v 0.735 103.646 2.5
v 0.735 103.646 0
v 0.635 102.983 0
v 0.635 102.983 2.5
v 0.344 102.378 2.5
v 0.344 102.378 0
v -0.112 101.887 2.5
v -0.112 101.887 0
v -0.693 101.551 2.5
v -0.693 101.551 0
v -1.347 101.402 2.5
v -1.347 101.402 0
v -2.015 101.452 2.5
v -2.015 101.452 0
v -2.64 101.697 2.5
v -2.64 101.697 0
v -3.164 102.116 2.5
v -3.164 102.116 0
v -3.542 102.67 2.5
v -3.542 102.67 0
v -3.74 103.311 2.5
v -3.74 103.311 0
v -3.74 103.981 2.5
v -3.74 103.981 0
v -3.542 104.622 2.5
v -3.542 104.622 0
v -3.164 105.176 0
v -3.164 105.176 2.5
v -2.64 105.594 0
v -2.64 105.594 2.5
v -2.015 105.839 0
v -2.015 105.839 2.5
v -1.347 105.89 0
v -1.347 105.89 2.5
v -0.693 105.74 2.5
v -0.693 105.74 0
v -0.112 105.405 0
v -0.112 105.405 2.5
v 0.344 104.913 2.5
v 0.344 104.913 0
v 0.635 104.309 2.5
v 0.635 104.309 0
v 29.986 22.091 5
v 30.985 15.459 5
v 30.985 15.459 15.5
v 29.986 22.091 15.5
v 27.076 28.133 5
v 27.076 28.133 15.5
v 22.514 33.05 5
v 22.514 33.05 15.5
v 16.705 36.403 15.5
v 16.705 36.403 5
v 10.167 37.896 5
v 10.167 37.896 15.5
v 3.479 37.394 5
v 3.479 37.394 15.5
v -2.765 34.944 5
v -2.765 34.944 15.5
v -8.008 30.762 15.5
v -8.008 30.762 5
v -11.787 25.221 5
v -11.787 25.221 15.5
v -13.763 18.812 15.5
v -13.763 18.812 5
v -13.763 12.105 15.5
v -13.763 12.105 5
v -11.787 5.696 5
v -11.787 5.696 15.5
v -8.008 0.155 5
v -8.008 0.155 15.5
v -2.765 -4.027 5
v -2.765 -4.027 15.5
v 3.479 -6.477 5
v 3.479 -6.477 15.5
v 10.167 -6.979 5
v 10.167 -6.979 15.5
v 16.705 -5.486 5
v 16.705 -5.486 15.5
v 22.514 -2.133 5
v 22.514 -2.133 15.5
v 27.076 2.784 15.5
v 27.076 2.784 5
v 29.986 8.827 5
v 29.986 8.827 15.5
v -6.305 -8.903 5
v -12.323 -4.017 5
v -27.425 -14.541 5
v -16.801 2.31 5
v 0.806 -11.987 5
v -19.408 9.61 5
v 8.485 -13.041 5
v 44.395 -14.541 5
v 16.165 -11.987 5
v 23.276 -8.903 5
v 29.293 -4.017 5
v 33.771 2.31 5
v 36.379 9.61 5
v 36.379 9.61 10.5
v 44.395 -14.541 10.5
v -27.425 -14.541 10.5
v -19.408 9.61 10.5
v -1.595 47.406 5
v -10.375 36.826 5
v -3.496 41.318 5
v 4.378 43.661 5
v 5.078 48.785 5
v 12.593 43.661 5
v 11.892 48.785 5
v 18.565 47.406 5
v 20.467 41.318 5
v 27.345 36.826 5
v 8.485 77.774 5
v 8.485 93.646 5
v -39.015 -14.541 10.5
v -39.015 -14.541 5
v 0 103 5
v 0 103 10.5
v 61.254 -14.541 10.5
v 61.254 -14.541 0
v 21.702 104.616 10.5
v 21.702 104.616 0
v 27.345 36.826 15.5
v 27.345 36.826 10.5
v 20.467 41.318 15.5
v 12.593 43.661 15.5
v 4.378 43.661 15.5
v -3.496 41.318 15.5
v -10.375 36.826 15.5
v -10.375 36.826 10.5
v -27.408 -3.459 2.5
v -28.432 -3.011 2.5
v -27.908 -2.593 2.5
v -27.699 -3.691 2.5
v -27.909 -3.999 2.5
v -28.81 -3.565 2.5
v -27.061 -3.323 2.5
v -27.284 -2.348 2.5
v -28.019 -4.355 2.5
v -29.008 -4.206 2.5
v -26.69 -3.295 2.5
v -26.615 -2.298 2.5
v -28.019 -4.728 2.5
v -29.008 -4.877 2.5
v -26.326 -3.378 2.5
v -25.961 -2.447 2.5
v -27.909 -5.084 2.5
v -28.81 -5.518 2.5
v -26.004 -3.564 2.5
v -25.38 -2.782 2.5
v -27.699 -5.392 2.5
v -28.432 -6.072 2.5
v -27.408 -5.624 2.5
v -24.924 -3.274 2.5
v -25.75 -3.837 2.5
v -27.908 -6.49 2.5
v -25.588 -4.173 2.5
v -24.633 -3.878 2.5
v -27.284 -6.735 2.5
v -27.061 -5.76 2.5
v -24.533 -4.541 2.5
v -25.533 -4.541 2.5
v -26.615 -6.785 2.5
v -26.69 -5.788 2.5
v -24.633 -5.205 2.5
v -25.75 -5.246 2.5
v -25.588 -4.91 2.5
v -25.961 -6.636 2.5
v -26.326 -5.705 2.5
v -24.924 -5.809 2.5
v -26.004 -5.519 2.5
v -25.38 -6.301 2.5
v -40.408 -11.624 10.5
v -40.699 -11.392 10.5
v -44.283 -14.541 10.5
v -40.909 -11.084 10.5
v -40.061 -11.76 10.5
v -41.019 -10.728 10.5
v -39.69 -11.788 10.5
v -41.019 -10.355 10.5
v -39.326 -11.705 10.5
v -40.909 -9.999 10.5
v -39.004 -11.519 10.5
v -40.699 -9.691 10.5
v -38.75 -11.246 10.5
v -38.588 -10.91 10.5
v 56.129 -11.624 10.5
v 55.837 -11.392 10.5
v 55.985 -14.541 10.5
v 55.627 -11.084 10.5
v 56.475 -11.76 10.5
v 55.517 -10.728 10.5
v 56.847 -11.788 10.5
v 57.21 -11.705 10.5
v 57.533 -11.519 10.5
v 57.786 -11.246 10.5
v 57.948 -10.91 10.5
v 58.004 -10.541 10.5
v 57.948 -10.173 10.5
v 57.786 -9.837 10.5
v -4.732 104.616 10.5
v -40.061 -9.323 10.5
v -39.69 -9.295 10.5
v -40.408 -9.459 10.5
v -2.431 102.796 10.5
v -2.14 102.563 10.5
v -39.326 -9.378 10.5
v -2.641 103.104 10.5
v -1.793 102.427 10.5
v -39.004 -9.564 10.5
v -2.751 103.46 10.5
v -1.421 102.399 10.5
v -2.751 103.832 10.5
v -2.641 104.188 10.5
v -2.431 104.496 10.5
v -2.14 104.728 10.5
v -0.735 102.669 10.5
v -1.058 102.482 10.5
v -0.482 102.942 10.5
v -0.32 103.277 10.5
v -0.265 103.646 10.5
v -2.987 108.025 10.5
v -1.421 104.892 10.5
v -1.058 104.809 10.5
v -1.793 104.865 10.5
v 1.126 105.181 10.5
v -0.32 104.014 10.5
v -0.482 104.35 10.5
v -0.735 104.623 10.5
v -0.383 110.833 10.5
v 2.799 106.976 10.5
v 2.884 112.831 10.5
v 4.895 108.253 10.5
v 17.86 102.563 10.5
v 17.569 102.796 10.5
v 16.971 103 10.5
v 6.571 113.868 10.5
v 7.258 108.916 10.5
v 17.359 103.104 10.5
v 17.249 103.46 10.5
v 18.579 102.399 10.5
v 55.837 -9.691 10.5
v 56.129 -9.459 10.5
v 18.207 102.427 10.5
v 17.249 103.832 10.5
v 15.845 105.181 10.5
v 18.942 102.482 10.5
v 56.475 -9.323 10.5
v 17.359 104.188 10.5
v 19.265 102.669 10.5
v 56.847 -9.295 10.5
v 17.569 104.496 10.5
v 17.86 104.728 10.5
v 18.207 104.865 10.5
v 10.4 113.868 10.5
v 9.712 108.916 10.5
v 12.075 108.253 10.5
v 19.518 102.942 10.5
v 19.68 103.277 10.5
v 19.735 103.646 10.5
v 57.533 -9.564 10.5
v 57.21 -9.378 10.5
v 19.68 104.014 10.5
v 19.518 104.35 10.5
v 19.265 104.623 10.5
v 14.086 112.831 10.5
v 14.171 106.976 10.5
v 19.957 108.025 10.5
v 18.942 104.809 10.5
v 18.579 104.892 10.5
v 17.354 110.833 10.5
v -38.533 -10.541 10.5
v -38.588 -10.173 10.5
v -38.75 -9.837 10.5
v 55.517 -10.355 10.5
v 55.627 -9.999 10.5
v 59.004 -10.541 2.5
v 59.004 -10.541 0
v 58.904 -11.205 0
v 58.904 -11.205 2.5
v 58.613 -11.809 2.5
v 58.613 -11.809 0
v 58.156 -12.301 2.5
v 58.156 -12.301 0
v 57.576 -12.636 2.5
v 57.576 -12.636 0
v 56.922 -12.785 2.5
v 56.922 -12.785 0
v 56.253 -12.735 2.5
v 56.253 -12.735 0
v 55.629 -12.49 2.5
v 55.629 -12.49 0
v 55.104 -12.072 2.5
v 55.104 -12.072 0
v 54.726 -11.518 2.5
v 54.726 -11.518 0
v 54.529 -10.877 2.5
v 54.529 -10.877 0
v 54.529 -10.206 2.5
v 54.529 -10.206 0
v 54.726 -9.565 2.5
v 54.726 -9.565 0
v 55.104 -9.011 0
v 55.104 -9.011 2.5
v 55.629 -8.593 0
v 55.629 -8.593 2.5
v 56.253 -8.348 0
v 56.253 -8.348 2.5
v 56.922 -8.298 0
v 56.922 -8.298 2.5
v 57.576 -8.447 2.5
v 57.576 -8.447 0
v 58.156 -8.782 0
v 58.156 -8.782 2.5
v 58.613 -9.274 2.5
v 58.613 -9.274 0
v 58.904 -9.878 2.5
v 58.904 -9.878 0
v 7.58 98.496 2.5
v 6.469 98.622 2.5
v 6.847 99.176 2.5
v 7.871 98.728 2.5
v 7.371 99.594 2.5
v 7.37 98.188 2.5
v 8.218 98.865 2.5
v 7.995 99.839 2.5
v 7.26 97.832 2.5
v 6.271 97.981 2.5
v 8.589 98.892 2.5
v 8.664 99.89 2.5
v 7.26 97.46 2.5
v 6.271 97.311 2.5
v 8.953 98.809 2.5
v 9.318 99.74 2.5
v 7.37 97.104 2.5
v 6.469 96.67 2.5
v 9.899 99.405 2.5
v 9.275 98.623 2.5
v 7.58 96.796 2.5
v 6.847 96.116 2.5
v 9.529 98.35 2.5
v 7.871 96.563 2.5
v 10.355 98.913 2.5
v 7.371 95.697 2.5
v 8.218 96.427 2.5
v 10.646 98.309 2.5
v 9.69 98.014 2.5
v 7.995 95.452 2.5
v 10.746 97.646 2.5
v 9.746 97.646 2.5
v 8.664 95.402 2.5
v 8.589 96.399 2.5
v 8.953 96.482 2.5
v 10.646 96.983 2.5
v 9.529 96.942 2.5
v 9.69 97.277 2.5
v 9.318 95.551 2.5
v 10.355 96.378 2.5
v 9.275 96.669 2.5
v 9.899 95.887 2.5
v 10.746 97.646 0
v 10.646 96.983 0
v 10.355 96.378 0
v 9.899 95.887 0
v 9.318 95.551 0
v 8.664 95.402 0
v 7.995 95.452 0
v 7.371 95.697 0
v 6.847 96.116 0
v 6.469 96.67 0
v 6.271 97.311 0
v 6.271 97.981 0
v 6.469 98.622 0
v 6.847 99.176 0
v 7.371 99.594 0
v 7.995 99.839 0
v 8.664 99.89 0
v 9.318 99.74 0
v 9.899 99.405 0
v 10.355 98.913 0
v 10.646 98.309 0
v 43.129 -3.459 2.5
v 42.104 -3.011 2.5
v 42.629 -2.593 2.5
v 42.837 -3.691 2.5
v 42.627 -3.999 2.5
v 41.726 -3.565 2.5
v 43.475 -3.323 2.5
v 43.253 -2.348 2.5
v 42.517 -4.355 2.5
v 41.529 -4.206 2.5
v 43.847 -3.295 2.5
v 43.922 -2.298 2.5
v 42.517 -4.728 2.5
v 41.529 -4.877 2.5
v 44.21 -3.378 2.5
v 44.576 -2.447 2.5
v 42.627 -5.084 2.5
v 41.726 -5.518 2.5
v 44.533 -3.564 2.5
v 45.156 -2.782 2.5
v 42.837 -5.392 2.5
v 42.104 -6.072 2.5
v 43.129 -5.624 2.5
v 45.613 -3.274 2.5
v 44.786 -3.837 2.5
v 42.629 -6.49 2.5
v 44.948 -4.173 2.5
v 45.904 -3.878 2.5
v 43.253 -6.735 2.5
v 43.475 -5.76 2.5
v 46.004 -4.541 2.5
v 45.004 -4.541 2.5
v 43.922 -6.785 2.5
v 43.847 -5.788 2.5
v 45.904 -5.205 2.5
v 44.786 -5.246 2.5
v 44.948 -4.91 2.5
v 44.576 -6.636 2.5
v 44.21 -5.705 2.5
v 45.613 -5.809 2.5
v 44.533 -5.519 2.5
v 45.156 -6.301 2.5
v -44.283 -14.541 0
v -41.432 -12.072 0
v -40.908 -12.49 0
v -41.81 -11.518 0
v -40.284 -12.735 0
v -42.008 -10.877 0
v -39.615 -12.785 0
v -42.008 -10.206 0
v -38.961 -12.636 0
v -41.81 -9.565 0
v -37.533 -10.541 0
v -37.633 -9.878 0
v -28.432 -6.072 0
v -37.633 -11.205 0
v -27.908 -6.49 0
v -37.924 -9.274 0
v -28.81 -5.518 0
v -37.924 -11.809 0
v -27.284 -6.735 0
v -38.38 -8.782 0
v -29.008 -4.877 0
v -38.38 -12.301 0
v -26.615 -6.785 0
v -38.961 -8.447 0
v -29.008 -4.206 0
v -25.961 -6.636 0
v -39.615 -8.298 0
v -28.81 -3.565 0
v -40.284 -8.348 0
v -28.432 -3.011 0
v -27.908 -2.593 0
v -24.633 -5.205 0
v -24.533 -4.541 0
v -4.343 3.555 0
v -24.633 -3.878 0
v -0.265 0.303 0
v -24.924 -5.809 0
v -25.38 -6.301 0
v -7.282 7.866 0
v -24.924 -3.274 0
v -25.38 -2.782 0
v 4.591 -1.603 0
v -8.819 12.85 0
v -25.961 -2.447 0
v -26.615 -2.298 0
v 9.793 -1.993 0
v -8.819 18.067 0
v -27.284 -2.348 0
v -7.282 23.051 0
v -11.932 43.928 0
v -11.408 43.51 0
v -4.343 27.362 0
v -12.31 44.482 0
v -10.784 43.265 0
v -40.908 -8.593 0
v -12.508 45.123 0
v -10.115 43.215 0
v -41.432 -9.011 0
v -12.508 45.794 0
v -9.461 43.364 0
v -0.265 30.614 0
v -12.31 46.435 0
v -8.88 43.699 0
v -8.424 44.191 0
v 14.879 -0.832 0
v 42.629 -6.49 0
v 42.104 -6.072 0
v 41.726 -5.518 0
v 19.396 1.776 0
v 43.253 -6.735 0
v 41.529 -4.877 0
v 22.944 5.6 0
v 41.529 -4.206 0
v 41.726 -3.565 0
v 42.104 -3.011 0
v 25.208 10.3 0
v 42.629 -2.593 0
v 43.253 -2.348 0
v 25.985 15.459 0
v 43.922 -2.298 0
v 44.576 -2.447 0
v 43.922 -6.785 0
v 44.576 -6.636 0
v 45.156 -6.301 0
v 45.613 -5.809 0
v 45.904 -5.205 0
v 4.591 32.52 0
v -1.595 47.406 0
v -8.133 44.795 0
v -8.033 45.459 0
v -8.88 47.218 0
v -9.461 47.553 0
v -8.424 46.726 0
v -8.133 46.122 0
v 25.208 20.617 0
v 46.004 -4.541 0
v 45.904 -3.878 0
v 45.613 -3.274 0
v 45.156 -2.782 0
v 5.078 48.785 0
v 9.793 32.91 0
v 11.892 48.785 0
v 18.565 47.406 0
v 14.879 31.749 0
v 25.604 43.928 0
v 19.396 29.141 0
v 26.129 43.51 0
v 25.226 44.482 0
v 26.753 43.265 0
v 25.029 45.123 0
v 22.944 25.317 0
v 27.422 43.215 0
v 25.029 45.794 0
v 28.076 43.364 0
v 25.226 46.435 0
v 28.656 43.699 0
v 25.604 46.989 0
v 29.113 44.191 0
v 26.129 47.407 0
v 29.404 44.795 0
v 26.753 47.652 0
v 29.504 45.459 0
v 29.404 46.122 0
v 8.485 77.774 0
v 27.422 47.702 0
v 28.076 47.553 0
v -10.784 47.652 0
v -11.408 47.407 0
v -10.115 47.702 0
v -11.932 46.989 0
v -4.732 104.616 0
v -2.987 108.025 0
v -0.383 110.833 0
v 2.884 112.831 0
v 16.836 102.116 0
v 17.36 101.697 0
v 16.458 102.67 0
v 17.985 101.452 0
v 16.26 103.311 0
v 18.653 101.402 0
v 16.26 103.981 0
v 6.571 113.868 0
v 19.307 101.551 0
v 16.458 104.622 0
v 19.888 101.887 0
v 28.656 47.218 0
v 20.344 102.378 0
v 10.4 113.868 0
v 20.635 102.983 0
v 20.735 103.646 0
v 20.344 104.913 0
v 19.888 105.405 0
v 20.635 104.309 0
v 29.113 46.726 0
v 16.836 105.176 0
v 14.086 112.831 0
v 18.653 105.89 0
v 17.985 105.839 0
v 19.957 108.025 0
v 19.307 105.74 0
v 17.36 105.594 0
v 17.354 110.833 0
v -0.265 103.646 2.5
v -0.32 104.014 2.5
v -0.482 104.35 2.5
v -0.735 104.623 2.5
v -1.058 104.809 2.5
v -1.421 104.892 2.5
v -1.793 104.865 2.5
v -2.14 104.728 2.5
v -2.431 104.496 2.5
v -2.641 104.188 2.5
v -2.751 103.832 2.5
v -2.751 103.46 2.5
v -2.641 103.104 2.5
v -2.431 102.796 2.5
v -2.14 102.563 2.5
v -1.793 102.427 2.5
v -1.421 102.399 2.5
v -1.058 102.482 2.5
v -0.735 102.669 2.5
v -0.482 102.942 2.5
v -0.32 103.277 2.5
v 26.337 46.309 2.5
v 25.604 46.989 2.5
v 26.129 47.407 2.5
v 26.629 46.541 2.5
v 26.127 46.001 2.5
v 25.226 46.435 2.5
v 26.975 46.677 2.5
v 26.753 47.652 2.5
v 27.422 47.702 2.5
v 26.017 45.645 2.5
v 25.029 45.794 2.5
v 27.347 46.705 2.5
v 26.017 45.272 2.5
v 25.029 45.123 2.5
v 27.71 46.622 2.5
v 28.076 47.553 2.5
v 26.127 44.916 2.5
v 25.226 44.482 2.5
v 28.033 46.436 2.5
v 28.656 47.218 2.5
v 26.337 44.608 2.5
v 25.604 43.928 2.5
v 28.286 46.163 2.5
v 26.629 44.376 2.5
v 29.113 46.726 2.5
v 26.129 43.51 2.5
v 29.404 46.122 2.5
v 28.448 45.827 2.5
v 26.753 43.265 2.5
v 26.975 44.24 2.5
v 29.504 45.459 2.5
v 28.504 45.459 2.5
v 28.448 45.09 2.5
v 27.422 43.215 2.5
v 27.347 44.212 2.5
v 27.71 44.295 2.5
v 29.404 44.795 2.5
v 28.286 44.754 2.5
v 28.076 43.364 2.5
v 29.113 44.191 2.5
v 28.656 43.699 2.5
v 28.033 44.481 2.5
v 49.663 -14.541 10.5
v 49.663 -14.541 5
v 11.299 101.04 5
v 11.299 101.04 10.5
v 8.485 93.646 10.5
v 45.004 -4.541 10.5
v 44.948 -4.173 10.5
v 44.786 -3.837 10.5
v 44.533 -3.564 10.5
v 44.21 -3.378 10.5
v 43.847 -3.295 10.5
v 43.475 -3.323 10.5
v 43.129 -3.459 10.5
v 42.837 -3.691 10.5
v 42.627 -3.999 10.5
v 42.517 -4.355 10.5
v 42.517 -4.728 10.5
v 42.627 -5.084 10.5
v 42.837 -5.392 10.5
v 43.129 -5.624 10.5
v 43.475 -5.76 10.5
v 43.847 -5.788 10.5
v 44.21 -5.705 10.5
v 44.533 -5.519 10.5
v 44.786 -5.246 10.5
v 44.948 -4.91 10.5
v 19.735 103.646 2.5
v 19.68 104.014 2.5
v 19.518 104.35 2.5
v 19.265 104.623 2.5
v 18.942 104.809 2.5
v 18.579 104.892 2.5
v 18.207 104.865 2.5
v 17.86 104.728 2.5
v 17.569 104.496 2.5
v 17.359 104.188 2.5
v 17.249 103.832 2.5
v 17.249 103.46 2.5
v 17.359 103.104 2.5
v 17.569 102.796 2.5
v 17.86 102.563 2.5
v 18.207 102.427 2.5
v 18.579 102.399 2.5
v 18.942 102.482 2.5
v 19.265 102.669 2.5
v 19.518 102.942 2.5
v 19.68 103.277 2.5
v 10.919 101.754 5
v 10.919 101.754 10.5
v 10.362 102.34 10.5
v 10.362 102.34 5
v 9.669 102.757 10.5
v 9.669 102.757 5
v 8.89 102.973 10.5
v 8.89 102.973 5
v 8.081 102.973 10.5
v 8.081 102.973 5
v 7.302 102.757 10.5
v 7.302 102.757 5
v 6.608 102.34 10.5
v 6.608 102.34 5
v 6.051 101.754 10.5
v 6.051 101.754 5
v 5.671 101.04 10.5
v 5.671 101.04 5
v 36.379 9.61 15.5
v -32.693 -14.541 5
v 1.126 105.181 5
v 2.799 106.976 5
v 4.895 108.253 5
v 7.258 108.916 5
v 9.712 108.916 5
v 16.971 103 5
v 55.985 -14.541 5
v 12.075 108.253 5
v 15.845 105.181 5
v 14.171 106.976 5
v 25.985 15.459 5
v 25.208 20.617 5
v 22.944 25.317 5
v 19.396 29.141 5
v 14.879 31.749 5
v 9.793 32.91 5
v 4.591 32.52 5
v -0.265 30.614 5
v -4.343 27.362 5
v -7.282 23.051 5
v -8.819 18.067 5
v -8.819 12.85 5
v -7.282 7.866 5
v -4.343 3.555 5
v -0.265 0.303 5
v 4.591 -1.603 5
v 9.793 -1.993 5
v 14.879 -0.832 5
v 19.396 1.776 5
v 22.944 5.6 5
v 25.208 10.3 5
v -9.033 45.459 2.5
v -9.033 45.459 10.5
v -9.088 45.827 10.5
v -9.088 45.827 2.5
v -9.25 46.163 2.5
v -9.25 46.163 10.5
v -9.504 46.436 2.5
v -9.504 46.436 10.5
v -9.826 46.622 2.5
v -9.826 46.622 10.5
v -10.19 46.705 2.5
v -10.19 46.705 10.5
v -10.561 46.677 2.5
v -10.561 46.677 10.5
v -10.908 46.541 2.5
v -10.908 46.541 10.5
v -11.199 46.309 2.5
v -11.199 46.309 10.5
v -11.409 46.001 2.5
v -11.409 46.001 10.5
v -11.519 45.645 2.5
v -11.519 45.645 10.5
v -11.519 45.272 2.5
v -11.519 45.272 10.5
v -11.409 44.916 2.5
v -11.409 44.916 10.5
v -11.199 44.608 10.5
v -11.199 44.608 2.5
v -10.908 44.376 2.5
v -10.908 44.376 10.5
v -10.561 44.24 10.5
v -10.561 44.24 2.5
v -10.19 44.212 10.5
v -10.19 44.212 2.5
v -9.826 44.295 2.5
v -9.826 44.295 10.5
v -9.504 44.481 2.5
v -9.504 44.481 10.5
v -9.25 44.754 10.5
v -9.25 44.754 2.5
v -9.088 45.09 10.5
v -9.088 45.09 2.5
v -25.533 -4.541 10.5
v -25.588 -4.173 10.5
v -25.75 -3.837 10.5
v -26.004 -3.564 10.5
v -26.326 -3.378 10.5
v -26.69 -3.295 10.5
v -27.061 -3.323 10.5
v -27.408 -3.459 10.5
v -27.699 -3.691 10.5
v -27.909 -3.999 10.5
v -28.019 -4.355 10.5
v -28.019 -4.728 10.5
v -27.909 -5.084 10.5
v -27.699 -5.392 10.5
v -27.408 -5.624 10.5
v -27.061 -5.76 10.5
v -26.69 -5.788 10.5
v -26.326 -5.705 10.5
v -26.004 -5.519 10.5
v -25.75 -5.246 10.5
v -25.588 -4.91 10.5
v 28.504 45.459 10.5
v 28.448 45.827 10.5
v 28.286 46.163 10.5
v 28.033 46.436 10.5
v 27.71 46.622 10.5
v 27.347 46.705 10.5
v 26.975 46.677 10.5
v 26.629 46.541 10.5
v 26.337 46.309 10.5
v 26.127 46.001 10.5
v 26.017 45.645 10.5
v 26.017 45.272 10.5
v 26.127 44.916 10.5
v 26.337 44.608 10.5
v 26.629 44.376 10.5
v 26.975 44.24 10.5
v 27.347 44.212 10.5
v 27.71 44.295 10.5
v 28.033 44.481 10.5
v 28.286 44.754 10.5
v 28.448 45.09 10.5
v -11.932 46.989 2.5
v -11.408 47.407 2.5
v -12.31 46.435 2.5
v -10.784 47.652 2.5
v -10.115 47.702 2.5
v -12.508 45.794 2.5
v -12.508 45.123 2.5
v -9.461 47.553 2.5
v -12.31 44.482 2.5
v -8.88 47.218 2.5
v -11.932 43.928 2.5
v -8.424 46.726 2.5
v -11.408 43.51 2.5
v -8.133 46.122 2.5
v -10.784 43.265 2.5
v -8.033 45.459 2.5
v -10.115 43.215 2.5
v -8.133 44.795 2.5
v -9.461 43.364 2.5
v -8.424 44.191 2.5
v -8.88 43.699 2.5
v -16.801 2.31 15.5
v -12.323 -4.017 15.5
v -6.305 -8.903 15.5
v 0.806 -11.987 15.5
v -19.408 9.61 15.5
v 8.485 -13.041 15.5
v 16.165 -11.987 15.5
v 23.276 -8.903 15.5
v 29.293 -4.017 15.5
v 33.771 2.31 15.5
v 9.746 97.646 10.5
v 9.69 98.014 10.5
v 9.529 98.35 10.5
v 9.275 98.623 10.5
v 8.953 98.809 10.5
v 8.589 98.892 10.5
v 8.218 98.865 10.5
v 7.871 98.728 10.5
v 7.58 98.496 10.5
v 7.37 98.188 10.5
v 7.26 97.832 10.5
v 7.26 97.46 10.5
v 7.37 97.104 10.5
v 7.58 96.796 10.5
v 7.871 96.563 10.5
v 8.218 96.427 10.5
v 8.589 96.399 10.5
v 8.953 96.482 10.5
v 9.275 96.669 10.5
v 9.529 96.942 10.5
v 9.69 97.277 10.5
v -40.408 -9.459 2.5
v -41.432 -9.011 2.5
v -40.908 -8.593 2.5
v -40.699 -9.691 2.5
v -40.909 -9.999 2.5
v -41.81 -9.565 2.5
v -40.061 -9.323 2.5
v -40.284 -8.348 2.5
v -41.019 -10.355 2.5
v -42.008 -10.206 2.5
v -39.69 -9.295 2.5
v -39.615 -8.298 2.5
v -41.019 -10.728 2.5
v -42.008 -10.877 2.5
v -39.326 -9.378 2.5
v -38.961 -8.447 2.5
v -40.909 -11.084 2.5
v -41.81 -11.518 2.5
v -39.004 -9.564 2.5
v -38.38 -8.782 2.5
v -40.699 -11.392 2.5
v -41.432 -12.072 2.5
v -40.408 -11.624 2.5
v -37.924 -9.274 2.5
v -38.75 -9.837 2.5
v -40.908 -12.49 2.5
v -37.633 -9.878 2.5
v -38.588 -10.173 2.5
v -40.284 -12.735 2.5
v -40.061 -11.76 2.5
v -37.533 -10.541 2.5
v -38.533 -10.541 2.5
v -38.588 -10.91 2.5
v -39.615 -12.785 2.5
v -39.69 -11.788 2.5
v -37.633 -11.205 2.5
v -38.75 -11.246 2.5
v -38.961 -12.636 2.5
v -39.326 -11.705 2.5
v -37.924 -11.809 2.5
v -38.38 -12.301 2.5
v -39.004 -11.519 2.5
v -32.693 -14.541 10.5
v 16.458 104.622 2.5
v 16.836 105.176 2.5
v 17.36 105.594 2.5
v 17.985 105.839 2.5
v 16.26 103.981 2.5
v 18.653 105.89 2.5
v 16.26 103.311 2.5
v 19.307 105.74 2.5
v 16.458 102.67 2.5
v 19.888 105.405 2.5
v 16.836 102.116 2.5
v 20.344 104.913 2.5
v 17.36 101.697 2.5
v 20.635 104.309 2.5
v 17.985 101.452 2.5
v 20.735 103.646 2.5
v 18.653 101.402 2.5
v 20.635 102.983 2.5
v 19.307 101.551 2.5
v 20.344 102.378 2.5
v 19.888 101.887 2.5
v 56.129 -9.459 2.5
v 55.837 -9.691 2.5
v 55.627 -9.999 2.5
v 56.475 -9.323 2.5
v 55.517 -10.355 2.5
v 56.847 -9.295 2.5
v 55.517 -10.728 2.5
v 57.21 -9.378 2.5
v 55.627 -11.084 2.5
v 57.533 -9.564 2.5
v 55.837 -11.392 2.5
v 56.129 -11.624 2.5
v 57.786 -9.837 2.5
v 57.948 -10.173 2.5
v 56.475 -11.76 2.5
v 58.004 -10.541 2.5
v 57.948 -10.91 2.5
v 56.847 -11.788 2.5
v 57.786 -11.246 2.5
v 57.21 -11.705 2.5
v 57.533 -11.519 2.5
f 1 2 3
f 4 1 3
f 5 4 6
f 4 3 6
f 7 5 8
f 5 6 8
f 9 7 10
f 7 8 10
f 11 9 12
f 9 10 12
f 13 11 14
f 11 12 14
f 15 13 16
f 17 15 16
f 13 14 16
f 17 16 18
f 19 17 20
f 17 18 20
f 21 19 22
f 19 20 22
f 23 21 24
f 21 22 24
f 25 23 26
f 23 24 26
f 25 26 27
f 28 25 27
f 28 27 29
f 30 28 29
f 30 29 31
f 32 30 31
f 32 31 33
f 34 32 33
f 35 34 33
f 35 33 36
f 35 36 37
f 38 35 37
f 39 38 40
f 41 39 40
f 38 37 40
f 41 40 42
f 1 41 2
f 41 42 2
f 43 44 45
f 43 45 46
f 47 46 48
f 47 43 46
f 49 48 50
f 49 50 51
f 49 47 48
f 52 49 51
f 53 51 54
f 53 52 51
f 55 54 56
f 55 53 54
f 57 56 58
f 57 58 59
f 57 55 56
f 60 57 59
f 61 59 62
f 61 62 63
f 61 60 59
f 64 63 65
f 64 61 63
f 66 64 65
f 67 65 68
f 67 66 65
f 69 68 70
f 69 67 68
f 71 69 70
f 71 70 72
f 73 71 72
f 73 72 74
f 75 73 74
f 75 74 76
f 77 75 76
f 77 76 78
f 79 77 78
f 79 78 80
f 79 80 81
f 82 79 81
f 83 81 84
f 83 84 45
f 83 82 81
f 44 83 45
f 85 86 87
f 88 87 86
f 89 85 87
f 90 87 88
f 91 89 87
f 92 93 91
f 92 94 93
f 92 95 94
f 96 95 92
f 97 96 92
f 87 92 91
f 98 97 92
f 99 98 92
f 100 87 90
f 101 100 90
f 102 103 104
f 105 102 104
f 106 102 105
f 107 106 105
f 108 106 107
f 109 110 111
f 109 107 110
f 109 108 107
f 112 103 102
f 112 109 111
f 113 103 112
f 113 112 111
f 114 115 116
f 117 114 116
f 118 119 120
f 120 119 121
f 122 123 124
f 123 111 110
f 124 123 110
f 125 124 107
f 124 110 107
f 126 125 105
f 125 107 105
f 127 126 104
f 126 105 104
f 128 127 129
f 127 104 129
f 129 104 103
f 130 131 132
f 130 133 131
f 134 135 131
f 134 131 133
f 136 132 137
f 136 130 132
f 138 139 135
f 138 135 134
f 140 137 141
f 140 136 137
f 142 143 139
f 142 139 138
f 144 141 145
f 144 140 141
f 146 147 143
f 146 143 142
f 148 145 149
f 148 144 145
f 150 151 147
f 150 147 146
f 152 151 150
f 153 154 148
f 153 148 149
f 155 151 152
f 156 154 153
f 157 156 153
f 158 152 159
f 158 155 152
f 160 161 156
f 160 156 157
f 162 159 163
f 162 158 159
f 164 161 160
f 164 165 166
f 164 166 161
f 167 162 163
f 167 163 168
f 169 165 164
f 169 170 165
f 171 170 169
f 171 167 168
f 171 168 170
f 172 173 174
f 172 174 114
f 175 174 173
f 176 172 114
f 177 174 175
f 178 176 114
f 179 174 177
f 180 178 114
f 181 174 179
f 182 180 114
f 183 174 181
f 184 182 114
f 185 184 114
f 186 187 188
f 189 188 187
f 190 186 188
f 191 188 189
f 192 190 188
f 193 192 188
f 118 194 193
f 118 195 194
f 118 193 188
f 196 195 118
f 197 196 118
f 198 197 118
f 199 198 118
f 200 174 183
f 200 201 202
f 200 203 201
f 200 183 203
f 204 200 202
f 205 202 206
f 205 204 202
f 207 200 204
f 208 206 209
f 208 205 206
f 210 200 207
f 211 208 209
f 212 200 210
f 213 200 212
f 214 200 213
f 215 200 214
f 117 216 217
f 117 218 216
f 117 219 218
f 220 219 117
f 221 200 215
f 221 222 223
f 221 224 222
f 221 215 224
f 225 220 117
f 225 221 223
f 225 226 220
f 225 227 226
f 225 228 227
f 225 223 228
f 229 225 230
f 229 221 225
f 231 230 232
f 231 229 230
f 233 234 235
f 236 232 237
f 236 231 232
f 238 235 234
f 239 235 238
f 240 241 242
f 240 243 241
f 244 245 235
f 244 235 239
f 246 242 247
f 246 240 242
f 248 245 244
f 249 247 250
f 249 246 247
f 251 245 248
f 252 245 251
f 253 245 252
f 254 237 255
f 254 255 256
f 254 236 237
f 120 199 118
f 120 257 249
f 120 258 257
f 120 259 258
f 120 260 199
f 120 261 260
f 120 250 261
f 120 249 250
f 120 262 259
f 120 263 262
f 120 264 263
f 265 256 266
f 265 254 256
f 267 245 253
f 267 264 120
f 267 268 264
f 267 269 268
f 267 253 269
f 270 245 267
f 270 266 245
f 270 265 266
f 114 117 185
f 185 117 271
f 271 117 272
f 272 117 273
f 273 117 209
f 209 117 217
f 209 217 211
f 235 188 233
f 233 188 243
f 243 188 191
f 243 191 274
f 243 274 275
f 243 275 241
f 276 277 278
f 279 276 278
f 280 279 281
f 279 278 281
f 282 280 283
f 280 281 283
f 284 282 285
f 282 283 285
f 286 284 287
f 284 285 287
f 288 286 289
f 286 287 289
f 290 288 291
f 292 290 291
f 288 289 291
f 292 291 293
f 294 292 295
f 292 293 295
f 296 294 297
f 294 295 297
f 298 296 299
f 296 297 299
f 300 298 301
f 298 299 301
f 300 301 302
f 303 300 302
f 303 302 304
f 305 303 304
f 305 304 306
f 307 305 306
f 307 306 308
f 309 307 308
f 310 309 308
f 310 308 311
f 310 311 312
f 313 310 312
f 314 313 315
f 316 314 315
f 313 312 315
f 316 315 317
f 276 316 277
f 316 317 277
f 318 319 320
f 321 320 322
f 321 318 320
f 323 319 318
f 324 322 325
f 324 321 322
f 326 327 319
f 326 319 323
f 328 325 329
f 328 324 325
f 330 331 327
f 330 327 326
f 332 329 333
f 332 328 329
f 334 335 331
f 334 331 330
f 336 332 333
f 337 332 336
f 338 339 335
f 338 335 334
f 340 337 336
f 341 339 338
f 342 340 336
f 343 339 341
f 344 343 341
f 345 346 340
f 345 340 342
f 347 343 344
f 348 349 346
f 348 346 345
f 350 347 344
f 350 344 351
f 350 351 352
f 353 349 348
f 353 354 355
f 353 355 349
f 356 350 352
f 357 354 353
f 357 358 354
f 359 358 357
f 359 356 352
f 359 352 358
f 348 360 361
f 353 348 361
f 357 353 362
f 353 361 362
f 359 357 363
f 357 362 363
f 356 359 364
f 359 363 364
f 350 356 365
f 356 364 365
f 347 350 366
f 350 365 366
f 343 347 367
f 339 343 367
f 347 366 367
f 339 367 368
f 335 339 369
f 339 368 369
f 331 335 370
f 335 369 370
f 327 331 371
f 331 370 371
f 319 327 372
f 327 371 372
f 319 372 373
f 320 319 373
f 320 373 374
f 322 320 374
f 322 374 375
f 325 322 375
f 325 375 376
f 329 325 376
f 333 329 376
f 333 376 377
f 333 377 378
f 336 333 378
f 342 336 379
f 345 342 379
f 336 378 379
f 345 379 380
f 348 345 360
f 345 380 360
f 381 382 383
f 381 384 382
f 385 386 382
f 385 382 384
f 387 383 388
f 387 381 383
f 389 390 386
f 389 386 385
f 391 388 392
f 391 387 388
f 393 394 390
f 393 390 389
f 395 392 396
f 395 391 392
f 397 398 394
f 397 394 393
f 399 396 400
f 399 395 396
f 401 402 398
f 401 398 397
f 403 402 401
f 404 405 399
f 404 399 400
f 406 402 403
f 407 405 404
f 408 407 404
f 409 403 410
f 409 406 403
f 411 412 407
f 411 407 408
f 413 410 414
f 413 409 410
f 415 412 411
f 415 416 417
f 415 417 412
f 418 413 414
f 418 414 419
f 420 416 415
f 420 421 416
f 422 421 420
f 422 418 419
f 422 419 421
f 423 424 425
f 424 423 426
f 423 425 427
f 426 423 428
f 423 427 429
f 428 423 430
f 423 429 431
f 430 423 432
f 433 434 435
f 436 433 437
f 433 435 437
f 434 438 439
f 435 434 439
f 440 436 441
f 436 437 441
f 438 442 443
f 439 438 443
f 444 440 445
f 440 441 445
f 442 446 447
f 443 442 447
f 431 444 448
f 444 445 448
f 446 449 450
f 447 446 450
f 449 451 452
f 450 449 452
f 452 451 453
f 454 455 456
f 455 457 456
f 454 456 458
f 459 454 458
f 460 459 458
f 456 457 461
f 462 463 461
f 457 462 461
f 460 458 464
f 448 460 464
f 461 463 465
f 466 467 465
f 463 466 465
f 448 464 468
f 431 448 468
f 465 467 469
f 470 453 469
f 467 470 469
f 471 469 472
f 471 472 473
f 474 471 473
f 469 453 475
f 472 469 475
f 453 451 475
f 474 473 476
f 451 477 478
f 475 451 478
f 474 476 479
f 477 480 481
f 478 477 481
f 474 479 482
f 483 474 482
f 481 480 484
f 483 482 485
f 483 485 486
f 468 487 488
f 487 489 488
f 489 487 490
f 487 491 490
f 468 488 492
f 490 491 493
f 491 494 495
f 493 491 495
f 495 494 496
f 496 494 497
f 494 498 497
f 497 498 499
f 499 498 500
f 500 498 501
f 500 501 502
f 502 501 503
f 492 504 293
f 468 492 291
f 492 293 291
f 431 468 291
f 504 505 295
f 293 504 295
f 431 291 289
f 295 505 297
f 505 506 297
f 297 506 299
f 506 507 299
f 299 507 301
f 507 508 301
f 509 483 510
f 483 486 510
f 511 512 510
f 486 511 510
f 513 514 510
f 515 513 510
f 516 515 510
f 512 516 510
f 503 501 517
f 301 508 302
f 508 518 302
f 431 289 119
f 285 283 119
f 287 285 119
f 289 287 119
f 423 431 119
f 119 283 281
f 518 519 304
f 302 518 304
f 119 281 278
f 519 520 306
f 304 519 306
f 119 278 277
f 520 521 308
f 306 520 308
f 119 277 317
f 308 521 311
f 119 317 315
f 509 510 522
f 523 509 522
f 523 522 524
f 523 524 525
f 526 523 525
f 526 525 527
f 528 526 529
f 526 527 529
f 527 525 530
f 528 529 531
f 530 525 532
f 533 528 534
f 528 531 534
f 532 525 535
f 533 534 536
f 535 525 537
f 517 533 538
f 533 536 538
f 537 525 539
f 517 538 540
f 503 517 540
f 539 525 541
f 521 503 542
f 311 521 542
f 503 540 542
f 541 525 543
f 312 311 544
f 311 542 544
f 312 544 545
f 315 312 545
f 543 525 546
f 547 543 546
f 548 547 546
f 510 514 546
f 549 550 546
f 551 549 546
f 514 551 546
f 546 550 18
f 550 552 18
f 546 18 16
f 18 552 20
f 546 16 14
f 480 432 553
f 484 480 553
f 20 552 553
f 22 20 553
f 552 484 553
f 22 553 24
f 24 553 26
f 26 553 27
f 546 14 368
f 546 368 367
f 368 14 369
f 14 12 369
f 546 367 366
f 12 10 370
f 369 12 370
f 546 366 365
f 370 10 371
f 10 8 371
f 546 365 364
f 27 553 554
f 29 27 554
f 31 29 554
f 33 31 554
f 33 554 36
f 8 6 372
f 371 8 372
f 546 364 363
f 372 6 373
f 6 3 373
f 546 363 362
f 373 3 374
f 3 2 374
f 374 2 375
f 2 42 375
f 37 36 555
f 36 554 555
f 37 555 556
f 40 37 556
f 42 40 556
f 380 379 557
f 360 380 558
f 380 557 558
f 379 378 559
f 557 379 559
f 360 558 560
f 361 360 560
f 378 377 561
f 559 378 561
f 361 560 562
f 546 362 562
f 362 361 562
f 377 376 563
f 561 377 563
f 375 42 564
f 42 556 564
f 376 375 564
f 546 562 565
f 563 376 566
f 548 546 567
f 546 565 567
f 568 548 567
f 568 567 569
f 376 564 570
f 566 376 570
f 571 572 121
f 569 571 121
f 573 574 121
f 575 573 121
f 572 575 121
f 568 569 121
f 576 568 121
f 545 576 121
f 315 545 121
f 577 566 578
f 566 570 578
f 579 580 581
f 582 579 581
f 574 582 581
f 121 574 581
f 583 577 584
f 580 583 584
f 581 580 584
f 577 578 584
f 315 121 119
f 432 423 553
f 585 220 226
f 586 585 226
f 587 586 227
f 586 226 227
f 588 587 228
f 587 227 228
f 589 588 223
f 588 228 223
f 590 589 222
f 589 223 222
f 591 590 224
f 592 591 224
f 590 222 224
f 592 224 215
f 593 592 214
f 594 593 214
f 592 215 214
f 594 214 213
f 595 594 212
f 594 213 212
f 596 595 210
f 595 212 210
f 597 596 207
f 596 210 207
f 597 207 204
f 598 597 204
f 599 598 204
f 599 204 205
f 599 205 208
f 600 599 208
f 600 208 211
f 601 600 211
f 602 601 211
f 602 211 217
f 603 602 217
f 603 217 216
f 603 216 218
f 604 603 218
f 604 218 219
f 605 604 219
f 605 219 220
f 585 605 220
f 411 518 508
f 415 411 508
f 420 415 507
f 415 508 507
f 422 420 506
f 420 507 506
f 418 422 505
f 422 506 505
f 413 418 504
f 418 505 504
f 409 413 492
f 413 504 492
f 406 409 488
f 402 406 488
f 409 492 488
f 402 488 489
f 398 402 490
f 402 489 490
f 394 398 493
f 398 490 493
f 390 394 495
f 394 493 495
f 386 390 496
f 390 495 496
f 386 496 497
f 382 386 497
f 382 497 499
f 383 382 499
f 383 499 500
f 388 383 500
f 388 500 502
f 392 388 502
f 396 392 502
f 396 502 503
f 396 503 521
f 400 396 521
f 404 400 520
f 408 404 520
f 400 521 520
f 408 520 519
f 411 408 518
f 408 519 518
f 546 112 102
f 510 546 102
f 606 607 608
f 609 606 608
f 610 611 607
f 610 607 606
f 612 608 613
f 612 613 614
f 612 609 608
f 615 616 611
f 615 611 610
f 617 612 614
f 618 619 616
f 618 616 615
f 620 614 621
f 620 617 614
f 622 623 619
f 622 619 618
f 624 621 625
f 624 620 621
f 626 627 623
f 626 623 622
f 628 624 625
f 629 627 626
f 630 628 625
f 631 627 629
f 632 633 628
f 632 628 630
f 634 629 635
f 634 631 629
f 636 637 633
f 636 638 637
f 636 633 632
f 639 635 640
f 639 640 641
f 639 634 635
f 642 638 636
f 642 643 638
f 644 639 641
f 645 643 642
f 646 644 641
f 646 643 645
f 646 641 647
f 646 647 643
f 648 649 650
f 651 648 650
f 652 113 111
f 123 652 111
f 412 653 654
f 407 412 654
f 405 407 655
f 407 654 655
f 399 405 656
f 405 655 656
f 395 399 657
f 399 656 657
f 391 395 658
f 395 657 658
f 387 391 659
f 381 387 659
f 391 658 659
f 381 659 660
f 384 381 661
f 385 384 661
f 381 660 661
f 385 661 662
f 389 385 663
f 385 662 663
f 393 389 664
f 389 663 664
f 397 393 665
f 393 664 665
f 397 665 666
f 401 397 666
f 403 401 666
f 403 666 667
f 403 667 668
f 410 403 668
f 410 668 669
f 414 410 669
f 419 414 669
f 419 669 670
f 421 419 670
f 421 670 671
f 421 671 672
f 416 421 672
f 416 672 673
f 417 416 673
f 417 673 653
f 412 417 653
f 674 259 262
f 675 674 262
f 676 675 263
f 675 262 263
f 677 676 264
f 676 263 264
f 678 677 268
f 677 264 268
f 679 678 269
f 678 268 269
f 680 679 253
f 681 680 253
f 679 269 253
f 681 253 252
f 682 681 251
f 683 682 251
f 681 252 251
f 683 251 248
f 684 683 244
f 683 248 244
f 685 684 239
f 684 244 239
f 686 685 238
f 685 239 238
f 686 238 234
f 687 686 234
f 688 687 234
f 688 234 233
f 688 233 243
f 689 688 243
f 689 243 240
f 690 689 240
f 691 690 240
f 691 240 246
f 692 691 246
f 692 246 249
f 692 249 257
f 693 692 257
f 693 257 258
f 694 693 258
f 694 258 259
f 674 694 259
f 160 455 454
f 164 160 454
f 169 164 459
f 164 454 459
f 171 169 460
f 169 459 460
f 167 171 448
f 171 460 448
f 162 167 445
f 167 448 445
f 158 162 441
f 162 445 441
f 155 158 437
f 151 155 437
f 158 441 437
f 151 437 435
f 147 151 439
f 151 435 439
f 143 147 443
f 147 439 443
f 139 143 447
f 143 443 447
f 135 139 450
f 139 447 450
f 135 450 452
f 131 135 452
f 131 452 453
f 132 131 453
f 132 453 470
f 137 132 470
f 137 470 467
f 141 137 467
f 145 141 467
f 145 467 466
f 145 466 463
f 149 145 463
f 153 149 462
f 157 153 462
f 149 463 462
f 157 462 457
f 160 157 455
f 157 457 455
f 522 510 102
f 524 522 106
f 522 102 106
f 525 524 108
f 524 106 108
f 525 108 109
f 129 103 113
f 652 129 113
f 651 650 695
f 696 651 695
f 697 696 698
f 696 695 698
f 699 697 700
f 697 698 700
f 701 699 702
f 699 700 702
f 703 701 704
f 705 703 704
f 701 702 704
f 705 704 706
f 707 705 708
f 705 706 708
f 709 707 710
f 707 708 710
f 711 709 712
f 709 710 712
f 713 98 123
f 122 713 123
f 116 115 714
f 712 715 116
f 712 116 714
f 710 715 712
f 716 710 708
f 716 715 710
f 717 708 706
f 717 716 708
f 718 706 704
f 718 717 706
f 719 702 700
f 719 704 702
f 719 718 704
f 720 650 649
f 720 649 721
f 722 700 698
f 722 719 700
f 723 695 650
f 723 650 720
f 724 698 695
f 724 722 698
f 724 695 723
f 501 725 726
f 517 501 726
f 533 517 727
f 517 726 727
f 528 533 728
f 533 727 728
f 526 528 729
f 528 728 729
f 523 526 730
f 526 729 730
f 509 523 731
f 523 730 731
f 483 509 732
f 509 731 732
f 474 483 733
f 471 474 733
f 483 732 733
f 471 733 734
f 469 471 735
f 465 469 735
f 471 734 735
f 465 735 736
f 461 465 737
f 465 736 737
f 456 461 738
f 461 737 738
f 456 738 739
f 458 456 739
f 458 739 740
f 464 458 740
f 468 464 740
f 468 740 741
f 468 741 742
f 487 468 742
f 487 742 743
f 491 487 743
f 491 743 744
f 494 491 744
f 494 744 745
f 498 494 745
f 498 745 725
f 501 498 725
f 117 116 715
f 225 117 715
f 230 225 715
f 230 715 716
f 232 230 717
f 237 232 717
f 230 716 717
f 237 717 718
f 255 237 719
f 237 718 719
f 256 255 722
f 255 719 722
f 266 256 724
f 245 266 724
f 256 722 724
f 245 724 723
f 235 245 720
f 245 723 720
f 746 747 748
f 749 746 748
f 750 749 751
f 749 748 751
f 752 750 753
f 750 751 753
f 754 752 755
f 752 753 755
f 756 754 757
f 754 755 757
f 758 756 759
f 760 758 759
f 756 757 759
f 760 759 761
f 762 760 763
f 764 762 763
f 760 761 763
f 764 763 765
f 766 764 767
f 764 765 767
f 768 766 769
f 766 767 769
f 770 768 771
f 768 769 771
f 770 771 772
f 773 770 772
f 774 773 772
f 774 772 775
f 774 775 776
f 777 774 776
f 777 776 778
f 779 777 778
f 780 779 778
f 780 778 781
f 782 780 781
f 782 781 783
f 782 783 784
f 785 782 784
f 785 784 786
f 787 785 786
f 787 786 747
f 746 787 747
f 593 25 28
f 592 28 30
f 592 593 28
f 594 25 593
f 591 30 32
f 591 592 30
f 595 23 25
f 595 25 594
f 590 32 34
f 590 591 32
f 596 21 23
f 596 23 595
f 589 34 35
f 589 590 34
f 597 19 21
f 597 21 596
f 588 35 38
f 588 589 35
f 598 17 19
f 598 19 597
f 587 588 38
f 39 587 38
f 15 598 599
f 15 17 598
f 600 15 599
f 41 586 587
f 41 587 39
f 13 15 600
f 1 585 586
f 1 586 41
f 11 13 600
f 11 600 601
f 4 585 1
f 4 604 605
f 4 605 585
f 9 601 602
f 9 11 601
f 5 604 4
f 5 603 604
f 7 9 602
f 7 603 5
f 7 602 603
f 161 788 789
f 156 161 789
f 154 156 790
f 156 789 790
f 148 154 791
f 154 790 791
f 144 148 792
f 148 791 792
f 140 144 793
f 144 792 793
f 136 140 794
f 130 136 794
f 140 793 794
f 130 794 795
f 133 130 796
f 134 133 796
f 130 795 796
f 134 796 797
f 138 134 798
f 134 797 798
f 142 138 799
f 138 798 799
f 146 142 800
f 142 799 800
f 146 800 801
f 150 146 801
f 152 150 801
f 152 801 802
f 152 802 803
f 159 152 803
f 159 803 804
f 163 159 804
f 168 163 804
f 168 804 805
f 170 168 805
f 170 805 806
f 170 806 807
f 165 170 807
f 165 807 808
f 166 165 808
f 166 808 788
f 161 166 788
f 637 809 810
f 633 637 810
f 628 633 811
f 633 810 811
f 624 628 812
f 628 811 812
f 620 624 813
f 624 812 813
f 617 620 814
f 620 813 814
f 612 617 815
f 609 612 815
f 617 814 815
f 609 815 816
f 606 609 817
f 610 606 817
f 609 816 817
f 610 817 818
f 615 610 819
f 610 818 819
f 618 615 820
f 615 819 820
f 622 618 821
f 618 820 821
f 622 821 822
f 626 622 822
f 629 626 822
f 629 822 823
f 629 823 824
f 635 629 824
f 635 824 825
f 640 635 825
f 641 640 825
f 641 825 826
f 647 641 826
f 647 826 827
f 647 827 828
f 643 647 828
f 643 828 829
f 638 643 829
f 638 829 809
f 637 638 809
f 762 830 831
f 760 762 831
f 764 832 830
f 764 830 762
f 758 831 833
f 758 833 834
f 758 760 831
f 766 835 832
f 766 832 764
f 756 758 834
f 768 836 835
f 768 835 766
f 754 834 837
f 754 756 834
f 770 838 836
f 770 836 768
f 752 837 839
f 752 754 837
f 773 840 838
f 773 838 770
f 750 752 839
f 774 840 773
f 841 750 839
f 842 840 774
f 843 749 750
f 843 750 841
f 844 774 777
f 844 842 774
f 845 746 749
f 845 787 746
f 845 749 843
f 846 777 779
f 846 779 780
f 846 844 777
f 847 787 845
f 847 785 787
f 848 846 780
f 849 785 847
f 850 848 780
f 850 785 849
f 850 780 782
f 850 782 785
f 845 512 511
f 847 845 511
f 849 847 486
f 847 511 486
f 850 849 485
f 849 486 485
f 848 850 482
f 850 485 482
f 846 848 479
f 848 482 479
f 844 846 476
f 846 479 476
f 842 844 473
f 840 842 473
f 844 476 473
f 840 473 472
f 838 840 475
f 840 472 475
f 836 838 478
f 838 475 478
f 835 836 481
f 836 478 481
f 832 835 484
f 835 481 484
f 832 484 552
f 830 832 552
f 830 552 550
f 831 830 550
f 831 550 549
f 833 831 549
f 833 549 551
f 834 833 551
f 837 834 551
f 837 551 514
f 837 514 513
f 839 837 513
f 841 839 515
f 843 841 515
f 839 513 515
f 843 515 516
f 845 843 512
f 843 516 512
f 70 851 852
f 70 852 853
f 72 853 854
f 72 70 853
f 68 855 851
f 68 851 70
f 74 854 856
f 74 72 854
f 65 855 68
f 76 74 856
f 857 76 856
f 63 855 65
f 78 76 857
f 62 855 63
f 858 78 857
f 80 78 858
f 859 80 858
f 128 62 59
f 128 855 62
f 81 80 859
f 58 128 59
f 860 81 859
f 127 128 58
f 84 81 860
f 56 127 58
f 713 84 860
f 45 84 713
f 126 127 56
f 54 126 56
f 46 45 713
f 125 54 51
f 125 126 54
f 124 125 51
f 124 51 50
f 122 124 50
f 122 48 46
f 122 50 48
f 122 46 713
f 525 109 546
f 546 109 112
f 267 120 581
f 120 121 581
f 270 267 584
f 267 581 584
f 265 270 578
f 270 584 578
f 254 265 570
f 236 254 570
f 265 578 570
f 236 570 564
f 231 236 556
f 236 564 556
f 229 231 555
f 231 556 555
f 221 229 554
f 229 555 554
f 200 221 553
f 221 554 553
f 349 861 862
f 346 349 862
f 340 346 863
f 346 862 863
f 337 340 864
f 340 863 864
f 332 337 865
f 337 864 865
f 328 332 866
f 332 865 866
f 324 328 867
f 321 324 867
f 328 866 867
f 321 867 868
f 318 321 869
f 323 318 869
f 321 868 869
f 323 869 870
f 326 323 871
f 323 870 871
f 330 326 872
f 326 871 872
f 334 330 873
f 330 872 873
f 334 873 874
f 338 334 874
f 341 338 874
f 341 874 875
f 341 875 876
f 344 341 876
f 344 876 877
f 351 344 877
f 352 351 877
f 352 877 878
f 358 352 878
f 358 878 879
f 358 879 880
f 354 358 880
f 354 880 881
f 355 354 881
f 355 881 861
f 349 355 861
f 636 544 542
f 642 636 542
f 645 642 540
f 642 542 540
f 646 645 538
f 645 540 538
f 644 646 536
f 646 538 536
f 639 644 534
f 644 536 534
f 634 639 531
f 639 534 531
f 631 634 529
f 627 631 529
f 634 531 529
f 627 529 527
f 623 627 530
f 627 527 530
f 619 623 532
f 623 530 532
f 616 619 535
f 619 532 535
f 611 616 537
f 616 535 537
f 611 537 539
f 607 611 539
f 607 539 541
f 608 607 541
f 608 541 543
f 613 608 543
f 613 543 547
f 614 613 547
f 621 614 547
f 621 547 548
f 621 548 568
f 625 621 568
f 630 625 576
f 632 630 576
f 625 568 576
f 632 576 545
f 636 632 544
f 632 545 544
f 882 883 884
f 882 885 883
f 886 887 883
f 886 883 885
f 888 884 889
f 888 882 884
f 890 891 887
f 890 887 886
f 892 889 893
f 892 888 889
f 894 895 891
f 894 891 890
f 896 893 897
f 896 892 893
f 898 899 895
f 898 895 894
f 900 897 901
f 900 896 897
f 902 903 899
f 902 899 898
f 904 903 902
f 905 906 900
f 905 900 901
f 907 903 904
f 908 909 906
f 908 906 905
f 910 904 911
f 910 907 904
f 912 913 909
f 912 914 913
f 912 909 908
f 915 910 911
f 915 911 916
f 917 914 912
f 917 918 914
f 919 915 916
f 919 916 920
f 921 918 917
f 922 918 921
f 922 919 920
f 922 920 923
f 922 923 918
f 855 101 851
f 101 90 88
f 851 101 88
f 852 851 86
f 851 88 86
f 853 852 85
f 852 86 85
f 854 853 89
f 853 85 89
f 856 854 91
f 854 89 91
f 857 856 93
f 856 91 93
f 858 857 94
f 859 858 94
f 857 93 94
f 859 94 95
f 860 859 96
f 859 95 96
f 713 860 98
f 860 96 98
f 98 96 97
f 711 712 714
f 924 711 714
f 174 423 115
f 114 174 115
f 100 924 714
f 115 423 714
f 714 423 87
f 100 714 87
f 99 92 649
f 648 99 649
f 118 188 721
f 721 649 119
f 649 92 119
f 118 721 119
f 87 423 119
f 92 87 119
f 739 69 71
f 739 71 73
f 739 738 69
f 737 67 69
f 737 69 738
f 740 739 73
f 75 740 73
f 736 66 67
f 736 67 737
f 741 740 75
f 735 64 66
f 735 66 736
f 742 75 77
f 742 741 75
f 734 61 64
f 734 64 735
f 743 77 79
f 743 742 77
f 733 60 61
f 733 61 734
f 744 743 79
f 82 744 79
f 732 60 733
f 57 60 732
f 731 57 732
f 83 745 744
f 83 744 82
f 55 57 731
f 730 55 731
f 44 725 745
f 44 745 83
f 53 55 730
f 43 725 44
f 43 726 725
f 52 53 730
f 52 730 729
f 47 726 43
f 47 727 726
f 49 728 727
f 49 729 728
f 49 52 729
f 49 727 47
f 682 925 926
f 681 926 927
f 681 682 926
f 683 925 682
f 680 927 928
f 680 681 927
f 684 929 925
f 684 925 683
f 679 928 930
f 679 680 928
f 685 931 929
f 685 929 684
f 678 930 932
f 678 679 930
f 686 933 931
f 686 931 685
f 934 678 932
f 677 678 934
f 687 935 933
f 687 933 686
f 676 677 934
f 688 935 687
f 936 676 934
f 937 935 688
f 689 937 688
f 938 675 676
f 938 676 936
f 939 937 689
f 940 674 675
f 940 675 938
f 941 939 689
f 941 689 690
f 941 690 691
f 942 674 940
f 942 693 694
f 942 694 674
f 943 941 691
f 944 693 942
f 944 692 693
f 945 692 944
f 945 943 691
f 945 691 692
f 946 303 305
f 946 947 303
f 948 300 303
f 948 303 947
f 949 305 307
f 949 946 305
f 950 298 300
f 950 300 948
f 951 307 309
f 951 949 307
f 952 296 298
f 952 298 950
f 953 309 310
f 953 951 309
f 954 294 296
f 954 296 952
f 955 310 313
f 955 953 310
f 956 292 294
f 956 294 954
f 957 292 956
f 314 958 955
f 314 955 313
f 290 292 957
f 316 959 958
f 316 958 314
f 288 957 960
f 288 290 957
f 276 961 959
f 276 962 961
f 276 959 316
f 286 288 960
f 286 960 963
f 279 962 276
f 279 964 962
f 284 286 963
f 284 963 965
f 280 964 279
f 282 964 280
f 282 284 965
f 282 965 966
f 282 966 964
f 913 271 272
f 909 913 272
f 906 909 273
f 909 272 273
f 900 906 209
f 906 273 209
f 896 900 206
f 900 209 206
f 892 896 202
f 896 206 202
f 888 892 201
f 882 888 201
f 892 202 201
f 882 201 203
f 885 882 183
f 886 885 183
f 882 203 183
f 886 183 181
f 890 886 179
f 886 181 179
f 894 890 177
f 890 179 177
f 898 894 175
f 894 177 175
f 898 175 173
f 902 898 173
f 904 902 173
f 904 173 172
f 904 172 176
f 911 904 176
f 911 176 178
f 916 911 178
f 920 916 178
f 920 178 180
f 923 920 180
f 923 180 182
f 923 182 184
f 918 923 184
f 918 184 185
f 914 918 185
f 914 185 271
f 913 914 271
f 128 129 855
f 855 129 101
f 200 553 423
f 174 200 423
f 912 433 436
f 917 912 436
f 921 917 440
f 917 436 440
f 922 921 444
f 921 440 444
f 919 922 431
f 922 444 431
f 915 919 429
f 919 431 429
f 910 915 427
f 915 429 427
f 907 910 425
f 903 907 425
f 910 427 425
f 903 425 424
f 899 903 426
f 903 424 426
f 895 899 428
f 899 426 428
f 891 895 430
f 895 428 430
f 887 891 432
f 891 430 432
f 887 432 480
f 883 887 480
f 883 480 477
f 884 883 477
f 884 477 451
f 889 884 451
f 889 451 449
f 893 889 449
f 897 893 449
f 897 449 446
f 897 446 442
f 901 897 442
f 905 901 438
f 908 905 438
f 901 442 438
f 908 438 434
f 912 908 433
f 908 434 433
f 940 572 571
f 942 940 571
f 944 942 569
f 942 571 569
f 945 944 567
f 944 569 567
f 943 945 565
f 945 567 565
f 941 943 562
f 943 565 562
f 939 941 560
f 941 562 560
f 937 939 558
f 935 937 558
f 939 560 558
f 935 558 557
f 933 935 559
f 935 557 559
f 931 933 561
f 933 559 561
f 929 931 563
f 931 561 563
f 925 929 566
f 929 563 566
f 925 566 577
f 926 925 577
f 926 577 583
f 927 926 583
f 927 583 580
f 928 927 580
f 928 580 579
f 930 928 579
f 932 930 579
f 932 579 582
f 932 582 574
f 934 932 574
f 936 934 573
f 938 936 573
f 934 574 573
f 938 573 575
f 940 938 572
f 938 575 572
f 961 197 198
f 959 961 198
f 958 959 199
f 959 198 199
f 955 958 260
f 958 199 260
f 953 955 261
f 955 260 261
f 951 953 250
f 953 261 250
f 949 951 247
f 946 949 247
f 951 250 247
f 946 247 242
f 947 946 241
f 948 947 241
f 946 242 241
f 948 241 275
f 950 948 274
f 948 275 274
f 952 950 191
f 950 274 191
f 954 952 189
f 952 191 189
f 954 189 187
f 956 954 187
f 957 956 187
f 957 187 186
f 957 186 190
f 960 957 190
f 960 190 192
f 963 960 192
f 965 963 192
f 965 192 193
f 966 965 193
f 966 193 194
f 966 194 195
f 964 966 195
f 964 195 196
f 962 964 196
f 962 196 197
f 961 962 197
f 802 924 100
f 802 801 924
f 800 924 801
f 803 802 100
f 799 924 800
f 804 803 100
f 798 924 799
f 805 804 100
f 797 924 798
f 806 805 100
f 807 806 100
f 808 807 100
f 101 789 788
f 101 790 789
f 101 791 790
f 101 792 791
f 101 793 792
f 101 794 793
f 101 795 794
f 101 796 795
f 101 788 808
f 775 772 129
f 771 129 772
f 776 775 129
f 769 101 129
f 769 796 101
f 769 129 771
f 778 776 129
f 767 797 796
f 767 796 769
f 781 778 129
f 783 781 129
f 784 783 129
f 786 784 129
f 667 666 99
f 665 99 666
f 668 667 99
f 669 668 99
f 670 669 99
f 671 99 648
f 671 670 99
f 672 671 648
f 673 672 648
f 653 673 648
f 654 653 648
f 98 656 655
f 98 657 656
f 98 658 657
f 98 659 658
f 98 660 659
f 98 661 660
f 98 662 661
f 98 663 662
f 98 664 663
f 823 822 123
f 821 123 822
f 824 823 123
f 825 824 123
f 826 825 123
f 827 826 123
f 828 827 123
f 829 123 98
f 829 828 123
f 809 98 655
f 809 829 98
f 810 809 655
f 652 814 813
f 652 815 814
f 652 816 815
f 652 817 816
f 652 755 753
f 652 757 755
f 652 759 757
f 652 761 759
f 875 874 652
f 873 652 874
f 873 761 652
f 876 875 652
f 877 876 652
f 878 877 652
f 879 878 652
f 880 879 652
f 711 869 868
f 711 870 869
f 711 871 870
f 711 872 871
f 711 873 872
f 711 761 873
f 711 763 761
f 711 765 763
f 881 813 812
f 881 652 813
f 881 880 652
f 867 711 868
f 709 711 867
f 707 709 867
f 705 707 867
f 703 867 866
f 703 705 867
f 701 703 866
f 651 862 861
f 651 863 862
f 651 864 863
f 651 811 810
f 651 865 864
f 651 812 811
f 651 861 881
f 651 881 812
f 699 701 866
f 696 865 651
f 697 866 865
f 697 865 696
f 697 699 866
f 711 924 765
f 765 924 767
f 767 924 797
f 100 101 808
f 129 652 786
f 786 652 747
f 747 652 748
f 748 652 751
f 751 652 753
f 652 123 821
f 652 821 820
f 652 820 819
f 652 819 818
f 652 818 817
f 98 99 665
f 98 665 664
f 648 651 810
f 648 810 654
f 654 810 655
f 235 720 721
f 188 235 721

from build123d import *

# Parameters (mm, degrees)
F1_DEPTH  = 5
F3_DEPTH  = 5.5
F5_DEPTH  = 5.5
F6_R      = 22.5
F7_DEPTH  = 10.5
F8_R      = 17.5
F9_DEPTH  = 25
F11_DEPTH = 25
F12_R     = 1.25
F13_DEPTH = 11
F14_R     = 2.25
F15_DEPTH = 2.5


with BuildPart() as f1:
    # F0 (on Top) → F1 (new body)
    with BuildSketch(Plane.XY):
        with BuildLine():
            Line((50.7170443075, -14.5414772037), (55.9852813742, -14.5414772037))
            Line((55.9852813742, -14.5414772037), (16.9705627485, 103))
            ThreePointArc((16.9705627485, 103), (8.4852813742, 109), (0, 103))
            Line((0, 103), (-39.0147186258, -14.5414772037))
            Line((-39.0147186258, -14.5414772037), (-33.746481559, -14.5414772037))
            Line((-33.746481559, -14.5414772037), (4.7271265323, 101.3697708508))
            ThreePointArc((4.7271265323, 101.3697708508), (8.4852813742, 104), (12.2434362162, 101.3697708508))
            Line((12.2434362162, 101.3697708508), (50.7170443075, -14.5414772037))
        make_face()
        with BuildLine():
            Line((16.9705627485, 103), (55.9852813742, -14.5414772037))
            Line((55.9852813742, -14.5414772037), (61.253518441, -14.5414772037))
            Line((61.253518441, -14.5414772037), (21.7024158273, 104.6159892602))
            ThreePointArc((21.7024158273, 104.6159892602), (8.4852813742, 114), (-4.7318530788, 104.6159892602))
            Line((-4.7318530788, 104.6159892602), (-44.2829556925, -14.5414772037))
            Line((-44.2829556925, -14.5414772037), (-39.0147186258, -14.5414772037))
            Line((-39.0147186258, -14.5414772037), (0, 103))
            ThreePointArc((0, 103), (8.4852813742, 109), (16.9705627485, 103))
        make_face()
        with BuildLine():
            Line((-33.746481559, -14.5414772037), (50.7170443075, -14.5414772037))
            Line((50.7170443075, -14.5414772037), (12.2434362162, 101.3697708508))
            ThreePointArc((12.2434362162, 101.3697708508), (8.4852813742, 104), (4.7271265323, 101.3697708508))
            Line((4.7271265323, 101.3697708508), (-33.746481559, -14.5414772037))
        make_face()
    extrude(amount=F1_DEPTH)

    # F2 (on face) → F3 (join)
    with BuildSketch(Plane.XY.offset(5)):
        with BuildLine():
            Line((-39.0147186258, -14.5414772037), (0, 103))
            ThreePointArc((0, 103), (8.4852813742, 109), (16.9705627485, 103))
            Line((16.9705627485, 103), (55.9852813742, -14.5414772037))
            Line((55.9852813742, -14.5414772037), (61.253518441, -14.5414772037))
            Line((61.253518441, -14.5414772037), (21.7024158273, 104.6159892602))
            ThreePointArc((21.7024158273, 104.6159892602), (8.4852813742, 114), (-4.7318530788, 104.6159892602))
            Line((-4.7318530788, 104.6159892602), (-44.2829556925, -14.5414772037))
            Line((-44.2829556925, -14.5414772037), (-39.0147186258, -14.5414772037))
        make_face()
    extrude(amount=F3_DEPTH)

    # F4 (on face) → F5 (join)
    with BuildSketch(Plane.XY.offset(5)):
        with BuildLine():
            ThreePointArc((11.29925422, 101.0399792418), (8.4852813742, 103), (5.6713085285, 101.0399792418))
            Line((5.6713085285, 101.0399792418), (-32.6928341457, -14.5414772037))
            Line((-32.6928341457, -14.5414772037), (-27.424597079, -14.5414772037))
            Line((-27.424597079, -14.5414772037), (8.4852813742, 93.6459020283))
            Line((8.4852813742, 93.6459020283), (44.3951598274, -14.5414772037))
            Line((44.3951598274, -14.5414772037), (49.6633968942, -14.5414772037))
            Line((49.6633968942, -14.5414772037), (11.29925422, 101.0399792418))
        make_face()
    extrude(amount=F5_DEPTH)

    # F6 (on face) → F7 (join)
    with BuildSketch(Plane.XY.offset(5)):
        with BuildLine():
            Line((36.3787330735, 9.6099885954), (27.3452487141, 36.8255916626))
            ThreePointArc((27.3452487141, 36.8255916626), (8.4852813742, 43.9585227963), (-10.3746859657, 36.8255916626))
            Line((-10.3746859657, 36.8255916626), (-19.4081703251, 9.6099885954))
            ThreePointArc((-19.4081703251, 9.6099885954), (8.4852813742, -13.0414772037), (36.3787330735, 9.6099885954))
        make_face()
        with Locations((8.4852813742, 15.4585227963)):
            Circle(F6_R, mode=Mode.SUBTRACT)
    extrude(amount=F7_DEPTH)

    # F8 (on face) → F9 (cut)
    with BuildSketch(Plane.XY.offset(5)):
        with Locations((8.4852813742, 15.4585227963)):
            Circle(F8_R)
    extrude(amount=-F9_DEPTH, mode=Mode.SUBTRACT)

    # F10 (on face) → F11 (cut)
    with BuildSketch(Plane.XY.offset(5)):
        with BuildLine():
            Line((8.4852813742, 77.7740365146), (-1.5945371695, 47.4060932537))
            ThreePointArc((-1.5945371695, 47.4060932537), (8.4852813742, 48.9585227963), (18.5650999179, 47.4060932537))
            Line((18.5650999179, 47.4060932537), (8.4852813742, 77.7740365146))
        make_face()
    extrude(amount=-F11_DEPTH, mode=Mode.SUBTRACT)

    # F12 (on face) → F13 (cut)
    with BuildSketch(Plane.XY.offset(10.5)):
        with Locations((8.4959140697, 97.6459020283)):
            Circle(F12_R)
        with Locations((-1.5147186258, 103.6459020283)):
            Circle(F12_R)
        with Locations((18.4852813742, 103.6459020283)):
            Circle(F12_R)
        with Locations((-10.2829556925, 45.4585227963)):
            Circle(F12_R)
        with Locations((27.253518441, 45.4585227963)):
            Circle(F12_R)
        with Locations((56.753518441, -10.5414772037)):
            Circle(F12_R)
        with Locations((43.753518441, -4.5414772037)):
            Circle(F12_R)
        with Locations((-26.7829556925, -4.5414772037)):
            Circle(F12_R)
        with Locations((-39.7829556925, -10.5414772037)):
            Circle(F12_R)
    extrude(amount=-F13_DEPTH, mode=Mode.SUBTRACT)

    # F14 (on face) → F15 (cut)
    with BuildSketch(Plane(origin=(0, 0, 0), x_dir=(1, 0, 0), z_dir=(0, 0, -1))):
        with Locations((18.4852813742, -103.6459020283)):
            Circle(F14_R)
        with Locations((8.4959140697, -97.6459020283)):
            Circle(F14_R)
        with Locations((-1.5147186258, -103.6459020283)):
            Circle(F14_R)
        with Locations((-10.2829556925, -45.4585227963)):
            Circle(F14_R)
        with Locations((27.253518441, -45.4585227963)):
            Circle(F14_R)
        with Locations((-39.7829556925, 10.5414772037)):
            Circle(F14_R)
        with Locations((-26.7829556925, 4.5414772037)):
            Circle(F14_R)
        with Locations((43.753518441, 4.5414772037)):
            Circle(F14_R)
        with Locations((56.753518441, 10.5414772037)):
            Circle(F14_R)
    extrude(amount=-F15_DEPTH, mode=Mode.SUBTRACT)


solid = f1.part
